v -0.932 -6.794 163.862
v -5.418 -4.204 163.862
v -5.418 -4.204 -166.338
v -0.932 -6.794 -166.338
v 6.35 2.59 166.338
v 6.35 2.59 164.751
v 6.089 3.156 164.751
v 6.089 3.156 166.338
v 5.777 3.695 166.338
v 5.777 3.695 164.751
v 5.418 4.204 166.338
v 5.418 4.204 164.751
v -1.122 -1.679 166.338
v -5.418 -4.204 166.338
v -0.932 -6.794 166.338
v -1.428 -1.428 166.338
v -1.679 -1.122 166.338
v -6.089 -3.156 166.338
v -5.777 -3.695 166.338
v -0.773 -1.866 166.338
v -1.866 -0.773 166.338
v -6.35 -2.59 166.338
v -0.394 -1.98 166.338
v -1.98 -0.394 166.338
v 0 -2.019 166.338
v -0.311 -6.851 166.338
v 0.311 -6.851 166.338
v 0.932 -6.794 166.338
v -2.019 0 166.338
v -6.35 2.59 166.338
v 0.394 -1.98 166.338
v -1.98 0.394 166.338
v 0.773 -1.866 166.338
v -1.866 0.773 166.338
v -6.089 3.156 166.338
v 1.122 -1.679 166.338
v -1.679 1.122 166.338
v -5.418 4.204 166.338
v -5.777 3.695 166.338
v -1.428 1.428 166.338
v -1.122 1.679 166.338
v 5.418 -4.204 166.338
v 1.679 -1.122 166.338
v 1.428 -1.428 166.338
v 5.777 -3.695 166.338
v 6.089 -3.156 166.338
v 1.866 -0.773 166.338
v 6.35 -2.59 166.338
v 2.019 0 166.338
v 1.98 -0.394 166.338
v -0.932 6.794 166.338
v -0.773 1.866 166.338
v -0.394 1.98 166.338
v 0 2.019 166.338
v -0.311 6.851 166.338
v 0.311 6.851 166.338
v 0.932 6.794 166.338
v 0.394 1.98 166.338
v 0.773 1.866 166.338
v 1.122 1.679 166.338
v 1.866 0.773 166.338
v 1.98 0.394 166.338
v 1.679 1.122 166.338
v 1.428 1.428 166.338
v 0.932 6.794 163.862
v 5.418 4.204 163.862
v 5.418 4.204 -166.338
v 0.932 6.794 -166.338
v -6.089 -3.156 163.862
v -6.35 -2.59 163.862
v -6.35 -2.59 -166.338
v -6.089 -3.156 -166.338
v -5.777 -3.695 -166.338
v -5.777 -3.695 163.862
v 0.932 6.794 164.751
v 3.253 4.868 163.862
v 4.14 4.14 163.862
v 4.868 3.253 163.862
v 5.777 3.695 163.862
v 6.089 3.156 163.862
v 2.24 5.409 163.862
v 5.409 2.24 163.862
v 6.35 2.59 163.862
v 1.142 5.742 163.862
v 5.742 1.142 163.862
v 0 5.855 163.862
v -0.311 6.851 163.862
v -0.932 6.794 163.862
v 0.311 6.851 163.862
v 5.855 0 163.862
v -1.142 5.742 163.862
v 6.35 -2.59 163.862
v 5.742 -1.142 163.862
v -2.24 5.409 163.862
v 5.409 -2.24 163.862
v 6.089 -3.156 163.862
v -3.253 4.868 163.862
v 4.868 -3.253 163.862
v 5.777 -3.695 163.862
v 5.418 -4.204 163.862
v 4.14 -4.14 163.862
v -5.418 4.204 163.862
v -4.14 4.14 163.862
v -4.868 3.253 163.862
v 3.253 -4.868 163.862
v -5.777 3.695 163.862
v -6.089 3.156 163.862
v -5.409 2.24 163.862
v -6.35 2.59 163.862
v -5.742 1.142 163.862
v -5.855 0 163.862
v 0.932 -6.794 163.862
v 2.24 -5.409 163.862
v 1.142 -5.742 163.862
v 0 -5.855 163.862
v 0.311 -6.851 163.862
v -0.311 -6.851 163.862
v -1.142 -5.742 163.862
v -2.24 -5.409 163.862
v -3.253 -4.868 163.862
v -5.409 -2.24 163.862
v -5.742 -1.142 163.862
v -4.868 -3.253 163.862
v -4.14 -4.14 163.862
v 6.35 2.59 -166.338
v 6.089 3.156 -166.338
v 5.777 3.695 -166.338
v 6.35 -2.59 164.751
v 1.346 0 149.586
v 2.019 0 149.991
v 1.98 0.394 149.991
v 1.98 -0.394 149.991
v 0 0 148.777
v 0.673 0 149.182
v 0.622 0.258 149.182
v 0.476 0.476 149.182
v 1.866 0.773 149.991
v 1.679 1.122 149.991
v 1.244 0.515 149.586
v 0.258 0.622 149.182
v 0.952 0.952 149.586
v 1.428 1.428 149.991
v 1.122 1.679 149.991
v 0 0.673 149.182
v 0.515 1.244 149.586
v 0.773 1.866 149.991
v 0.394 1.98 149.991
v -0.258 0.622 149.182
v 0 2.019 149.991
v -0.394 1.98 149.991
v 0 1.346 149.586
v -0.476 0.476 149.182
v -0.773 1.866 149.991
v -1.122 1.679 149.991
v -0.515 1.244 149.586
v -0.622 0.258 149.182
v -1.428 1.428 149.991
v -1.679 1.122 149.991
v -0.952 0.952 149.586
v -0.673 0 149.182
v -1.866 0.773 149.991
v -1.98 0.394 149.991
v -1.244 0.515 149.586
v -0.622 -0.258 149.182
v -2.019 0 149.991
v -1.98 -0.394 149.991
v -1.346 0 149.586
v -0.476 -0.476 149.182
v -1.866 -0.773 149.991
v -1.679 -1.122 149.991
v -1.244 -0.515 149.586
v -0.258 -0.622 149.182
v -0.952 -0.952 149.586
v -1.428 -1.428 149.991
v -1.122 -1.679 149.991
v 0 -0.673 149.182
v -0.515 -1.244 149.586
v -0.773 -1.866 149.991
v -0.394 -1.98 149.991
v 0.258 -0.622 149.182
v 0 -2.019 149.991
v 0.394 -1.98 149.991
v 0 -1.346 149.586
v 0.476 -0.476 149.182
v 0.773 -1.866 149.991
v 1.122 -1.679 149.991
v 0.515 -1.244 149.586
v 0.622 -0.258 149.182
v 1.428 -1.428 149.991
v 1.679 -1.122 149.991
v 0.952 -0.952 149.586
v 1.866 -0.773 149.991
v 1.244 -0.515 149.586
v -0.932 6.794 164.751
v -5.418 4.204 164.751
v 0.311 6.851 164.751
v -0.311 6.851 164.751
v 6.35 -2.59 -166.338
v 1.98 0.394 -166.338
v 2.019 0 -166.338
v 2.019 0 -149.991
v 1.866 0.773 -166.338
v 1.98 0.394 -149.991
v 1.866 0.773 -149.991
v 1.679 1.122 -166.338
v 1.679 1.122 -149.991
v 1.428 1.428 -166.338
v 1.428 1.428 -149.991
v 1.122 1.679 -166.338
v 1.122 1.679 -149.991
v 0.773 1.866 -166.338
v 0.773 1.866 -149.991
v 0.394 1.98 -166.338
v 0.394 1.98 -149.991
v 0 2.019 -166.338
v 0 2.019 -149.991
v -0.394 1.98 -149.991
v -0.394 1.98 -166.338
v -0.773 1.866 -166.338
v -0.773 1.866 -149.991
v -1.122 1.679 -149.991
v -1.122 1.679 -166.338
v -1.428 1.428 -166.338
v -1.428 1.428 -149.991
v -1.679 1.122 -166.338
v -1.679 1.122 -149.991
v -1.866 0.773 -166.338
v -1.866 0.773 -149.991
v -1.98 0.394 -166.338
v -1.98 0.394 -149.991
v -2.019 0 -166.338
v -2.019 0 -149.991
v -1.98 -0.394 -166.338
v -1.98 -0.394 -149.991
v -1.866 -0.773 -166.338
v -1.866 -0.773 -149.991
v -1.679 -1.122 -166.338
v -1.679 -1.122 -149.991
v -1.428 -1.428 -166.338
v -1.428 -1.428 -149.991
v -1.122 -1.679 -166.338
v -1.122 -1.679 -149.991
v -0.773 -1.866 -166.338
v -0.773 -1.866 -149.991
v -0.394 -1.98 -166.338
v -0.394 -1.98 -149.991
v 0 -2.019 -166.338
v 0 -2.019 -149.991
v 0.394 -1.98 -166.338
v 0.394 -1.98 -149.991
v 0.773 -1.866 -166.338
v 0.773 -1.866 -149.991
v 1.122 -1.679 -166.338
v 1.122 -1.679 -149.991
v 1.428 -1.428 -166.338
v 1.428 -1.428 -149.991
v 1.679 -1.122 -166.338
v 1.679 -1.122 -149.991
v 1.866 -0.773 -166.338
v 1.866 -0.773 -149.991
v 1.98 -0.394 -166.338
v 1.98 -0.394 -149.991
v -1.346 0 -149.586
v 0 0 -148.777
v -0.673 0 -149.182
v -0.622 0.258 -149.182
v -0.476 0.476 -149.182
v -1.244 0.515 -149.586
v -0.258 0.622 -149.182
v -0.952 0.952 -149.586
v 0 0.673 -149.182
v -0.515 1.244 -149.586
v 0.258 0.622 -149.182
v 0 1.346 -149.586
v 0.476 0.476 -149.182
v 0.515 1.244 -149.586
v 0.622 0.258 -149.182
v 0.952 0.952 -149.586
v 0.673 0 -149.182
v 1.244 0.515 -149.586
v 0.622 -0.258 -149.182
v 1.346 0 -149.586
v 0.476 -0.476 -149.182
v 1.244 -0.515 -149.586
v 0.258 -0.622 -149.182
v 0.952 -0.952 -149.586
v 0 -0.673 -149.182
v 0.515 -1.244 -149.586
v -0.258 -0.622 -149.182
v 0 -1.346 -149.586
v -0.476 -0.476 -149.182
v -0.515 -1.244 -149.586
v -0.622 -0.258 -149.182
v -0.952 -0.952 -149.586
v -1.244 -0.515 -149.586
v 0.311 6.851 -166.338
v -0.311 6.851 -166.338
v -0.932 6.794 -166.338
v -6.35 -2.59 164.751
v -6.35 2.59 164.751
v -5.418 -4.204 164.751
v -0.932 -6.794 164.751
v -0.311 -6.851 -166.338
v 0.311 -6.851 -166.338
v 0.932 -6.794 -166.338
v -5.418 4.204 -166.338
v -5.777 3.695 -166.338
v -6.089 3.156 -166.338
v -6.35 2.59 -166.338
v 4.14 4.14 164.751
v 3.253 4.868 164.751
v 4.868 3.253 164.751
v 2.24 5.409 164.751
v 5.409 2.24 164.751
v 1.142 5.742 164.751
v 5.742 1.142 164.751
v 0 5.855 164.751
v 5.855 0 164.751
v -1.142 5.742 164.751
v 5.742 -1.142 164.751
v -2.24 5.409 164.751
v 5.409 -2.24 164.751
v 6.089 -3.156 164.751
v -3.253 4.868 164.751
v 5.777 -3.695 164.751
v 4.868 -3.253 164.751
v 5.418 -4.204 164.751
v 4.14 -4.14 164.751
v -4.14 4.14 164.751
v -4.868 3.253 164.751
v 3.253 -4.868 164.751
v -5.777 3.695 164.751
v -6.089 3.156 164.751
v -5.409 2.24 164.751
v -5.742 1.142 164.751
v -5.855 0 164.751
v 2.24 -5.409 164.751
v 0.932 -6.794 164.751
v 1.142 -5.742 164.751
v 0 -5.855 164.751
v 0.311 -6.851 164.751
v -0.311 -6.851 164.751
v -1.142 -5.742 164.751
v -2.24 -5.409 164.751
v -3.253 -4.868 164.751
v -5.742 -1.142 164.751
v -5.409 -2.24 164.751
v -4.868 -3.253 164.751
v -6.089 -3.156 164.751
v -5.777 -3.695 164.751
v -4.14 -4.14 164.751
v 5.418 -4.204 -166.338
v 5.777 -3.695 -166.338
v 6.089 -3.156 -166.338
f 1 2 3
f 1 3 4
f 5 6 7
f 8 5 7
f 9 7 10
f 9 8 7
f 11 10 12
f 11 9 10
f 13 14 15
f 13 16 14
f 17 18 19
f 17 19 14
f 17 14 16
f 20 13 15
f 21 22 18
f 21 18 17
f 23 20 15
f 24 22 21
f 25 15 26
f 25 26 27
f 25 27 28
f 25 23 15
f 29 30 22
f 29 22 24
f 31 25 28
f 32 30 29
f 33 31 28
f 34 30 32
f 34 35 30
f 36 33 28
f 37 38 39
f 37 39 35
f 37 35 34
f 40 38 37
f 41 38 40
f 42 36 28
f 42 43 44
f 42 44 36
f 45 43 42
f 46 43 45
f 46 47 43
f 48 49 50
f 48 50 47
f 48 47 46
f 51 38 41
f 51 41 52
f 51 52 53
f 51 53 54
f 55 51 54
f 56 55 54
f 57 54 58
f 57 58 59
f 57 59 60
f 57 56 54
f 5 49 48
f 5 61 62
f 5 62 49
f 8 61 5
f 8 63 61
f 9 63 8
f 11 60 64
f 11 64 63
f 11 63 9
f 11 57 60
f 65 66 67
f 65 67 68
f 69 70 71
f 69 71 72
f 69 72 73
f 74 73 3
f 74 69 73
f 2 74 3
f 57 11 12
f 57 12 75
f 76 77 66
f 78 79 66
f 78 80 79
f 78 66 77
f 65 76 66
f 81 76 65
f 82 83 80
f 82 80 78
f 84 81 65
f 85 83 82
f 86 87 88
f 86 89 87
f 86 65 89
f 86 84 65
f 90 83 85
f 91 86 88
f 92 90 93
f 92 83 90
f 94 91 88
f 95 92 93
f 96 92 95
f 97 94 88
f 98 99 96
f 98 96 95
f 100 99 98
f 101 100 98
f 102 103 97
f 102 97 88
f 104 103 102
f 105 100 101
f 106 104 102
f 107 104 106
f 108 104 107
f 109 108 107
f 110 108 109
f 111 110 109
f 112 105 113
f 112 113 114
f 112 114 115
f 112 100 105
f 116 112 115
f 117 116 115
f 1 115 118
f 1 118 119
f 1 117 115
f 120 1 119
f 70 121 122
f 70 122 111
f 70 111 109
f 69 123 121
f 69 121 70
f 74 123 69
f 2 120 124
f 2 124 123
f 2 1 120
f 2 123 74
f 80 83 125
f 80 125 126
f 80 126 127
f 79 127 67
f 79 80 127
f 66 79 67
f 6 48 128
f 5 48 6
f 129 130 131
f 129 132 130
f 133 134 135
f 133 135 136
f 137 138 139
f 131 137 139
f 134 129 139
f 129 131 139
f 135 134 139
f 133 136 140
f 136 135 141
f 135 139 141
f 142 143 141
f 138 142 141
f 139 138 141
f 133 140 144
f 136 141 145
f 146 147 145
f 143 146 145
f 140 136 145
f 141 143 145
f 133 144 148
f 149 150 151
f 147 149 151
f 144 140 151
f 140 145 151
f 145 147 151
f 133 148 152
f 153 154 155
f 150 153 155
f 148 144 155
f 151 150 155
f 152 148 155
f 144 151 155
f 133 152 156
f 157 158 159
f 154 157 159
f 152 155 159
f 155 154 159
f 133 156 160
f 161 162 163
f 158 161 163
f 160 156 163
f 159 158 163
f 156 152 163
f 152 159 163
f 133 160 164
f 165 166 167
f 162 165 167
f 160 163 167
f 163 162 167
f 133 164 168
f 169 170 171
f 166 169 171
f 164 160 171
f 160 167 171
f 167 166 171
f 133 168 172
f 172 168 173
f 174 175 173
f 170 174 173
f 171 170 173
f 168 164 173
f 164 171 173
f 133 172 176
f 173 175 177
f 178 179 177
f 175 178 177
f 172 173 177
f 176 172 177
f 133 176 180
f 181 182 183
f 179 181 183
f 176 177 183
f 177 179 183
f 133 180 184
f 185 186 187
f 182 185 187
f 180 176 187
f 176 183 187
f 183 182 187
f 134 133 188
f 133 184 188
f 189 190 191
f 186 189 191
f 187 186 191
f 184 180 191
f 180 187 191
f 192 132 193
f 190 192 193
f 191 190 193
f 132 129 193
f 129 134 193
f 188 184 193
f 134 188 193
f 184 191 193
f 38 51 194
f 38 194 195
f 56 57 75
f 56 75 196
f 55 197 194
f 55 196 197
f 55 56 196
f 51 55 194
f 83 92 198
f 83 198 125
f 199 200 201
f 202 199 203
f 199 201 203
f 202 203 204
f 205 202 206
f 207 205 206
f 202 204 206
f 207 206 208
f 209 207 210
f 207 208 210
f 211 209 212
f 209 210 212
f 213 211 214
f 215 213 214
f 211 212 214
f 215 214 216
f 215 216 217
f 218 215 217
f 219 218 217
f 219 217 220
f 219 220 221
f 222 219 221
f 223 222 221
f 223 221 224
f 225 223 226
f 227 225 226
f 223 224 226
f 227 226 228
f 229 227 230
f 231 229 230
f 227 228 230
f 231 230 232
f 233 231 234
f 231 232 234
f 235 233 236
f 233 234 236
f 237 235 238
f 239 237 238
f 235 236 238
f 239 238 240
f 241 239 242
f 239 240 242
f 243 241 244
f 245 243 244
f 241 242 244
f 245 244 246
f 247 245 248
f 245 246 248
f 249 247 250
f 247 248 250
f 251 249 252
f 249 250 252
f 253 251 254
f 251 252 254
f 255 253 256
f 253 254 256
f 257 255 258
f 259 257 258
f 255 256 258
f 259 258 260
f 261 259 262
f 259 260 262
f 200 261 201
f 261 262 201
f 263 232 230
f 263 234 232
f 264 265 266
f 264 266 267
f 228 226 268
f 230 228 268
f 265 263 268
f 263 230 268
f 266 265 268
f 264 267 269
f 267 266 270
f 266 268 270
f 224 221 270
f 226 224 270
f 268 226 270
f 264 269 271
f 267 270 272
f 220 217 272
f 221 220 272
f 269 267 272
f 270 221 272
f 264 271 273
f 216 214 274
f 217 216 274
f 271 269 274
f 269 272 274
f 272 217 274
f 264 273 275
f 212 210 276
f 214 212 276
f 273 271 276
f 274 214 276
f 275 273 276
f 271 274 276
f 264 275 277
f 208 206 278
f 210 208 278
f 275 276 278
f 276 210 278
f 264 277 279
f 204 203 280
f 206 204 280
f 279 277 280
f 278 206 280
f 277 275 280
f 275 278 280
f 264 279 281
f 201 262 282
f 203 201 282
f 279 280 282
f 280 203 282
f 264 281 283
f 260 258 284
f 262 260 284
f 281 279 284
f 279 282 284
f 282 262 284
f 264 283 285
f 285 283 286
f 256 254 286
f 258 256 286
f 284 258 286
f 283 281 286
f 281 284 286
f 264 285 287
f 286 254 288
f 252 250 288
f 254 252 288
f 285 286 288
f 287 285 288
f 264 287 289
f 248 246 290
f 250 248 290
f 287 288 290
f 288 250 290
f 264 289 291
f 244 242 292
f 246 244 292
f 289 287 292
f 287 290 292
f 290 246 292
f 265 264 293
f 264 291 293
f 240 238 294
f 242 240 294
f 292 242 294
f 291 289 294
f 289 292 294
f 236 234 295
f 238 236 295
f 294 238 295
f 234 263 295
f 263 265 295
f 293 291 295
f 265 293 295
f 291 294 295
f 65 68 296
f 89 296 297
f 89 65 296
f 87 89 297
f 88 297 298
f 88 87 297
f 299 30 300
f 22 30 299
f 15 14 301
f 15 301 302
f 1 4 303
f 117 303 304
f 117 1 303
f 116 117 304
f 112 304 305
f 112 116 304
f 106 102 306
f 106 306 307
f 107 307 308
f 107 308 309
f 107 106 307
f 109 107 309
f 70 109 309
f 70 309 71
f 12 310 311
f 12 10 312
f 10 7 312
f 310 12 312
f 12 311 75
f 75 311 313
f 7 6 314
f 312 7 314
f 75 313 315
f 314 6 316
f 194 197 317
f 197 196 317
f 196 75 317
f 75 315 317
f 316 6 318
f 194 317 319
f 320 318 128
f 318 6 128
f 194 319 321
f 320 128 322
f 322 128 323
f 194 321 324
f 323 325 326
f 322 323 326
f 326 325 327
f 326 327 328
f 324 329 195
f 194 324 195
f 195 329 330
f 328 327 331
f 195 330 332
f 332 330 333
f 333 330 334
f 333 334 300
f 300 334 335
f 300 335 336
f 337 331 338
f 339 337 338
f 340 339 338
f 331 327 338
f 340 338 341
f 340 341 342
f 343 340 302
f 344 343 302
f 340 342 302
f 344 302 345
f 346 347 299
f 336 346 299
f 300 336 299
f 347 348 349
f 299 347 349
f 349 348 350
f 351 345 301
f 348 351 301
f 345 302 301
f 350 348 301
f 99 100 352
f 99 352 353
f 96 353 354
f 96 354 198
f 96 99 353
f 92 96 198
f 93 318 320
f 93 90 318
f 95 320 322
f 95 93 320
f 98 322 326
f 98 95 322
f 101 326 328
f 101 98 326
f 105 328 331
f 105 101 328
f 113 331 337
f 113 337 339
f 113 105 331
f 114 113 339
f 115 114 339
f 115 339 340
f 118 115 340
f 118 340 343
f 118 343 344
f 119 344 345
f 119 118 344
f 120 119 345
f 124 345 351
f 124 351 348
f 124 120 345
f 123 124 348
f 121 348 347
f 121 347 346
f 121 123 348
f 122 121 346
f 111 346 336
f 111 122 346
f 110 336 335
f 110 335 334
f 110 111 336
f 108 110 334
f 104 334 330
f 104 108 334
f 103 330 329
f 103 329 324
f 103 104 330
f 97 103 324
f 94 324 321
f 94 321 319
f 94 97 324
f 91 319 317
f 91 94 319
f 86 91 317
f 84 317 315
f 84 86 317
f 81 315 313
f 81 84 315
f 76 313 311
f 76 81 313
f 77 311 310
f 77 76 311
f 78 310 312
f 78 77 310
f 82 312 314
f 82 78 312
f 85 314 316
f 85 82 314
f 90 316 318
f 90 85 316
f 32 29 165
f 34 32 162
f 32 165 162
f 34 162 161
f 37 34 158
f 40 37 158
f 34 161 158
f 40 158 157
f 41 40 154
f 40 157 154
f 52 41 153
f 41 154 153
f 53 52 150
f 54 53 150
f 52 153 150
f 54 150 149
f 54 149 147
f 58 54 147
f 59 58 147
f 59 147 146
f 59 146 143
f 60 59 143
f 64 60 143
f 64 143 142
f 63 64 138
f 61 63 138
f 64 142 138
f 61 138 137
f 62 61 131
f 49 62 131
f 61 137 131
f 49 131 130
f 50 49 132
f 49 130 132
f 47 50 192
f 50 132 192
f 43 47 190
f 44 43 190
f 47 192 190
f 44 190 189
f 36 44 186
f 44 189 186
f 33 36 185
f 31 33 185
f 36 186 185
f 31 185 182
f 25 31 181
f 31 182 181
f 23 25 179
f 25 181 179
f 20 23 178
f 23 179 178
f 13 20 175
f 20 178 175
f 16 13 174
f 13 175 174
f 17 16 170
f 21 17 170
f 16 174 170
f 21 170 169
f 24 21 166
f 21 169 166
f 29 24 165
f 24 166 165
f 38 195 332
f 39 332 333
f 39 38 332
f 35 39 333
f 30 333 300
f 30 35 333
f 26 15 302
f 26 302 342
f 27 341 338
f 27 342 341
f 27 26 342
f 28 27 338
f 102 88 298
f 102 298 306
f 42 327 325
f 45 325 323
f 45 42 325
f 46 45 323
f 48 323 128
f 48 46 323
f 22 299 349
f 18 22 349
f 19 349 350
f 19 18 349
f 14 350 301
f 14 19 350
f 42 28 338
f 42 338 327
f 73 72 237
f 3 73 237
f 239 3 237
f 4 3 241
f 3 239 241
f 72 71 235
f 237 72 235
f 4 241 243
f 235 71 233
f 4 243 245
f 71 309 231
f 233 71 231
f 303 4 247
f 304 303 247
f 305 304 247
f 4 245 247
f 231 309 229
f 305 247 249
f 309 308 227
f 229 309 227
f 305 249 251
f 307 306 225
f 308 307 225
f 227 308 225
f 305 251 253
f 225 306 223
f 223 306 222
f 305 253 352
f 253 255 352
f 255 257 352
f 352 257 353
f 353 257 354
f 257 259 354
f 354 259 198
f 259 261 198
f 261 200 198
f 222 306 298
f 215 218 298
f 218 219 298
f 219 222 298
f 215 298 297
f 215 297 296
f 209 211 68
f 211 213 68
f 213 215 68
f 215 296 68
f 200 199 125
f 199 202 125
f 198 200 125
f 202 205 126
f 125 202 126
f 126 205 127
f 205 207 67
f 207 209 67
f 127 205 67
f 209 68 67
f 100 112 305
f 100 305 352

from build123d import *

# Parameters (mm, degrees)
BOSS_EXTRUDE1_DEPTH                  = 166.33825
F_10_32_TAPPED_HOLE1_D               = 4.0386
F_10_32_TAPPED_HOLE1_DEPTH           = 16.34744
F_10_32_TAPPED_HOLE1_TIP             = 1.213317848
F_10_32_TAPPED_HOLE1_ON_FACE_2_D     = 4.0386
F_10_32_TAPPED_HOLE1_ON_FACE_2_DEPTH = 16.34744
F_10_32_TAPPED_HOLE1_ON_FACE_2_TIP   = 1.213317848
SKETCH5_W                            = 0.889
SKETCH5_H                            = 1.0033


with BuildPart() as part:
    # Sketch1 → Boss-Extrude1 (new, symmetric)
    with BuildSketch(Plane.XY):
        with BuildLine():
            ThreePointArc((0.93173274, 6.79441227), (0, 6.858), (-0.93173274, 6.79441227))
            Line((-0.93173274, 6.79441227), (-5.41826726, 4.204110358))
            ThreePointArc((-5.41826726, 4.204110358), (-5.939202219, 3.429), (-6.35, 2.590301913))
            Line((-6.35, 2.590301913), (-6.35, -2.590301913))
            ThreePointArc((-6.35, -2.590301913), (-5.939202219, -3.429), (-5.41826726, -4.204110358))
            Line((-5.41826726, -4.204110358), (-0.93173274, -6.79441227))
            ThreePointArc((-0.93173274, -6.79441227), (0, -6.858), (0.93173274, -6.79441227))
            Line((0.93173274, -6.79441227), (5.41826726, -4.204110358))
            ThreePointArc((5.41826726, -4.204110358), (5.939202219, -3.429), (6.35, -2.590301913))
            Line((6.35, -2.590301913), (6.35, 2.590301913))
            ThreePointArc((6.35, 2.590301913), (5.939202219, 3.429), (5.41826726, 4.204110358))
            Line((5.41826726, 4.204110358), (0.93173274, 6.79441227))
        make_face()
    extrude(amount=BOSS_EXTRUDE1_DEPTH, both=True)

    # #10-32 Tapped Hole1
    with Locations(Plane.XY.offset(166.33825)):
        with Locations((0, 0)):
            Hole(F_10_32_TAPPED_HOLE1_D / 2, depth=F_10_32_TAPPED_HOLE1_DEPTH)
            with Locations((0, 0, -(F_10_32_TAPPED_HOLE1_DEPTH + F_10_32_TAPPED_HOLE1_TIP / 2))):  # 118° drill point
                Cone(0, F_10_32_TAPPED_HOLE1_D / 2, F_10_32_TAPPED_HOLE1_TIP, mode=Mode.SUBTRACT)

    # #10-32 Tapped Hole1 on face 2
    with Locations(Plane(origin=(0, 0, -166.33825), x_dir=(-1, 0, 0), z_dir=(0, 0, -1))):
        with Locations((0, 0)):
            Hole(F_10_32_TAPPED_HOLE1_ON_FACE_2_D / 2, depth=F_10_32_TAPPED_HOLE1_ON_FACE_2_DEPTH)
            with Locations((0, 0, -(F_10_32_TAPPED_HOLE1_ON_FACE_2_DEPTH + F_10_32_TAPPED_HOLE1_ON_FACE_2_TIP / 2))):  # 118° drill point
                Cone(0, F_10_32_TAPPED_HOLE1_ON_FACE_2_D / 2, F_10_32_TAPPED_HOLE1_ON_FACE_2_TIP, mode=Mode.SUBTRACT)

    # Sketch5 → Cut-Revolve1 (revolve, cut)
    with BuildSketch(Plane(origin=(0, 0, 0), x_dir=(0, 0, -1), z_dir=(1, 0, 0)), mode=Mode.PRIVATE) as cut_revolve1_sk:
        with Locations((-164.30625, 6.35635)):
            Rectangle(SKETCH5_W, SKETCH5_H)
    revolve(cut_revolve1_sk.sketch.rotate(Axis((0, 0, 165.047176272), (0, 0, -1)), 90), axis=Axis((0, 0, 165.047176272), (0, 0, -1)), mode=Mode.SUBTRACT)


solid = part.part
